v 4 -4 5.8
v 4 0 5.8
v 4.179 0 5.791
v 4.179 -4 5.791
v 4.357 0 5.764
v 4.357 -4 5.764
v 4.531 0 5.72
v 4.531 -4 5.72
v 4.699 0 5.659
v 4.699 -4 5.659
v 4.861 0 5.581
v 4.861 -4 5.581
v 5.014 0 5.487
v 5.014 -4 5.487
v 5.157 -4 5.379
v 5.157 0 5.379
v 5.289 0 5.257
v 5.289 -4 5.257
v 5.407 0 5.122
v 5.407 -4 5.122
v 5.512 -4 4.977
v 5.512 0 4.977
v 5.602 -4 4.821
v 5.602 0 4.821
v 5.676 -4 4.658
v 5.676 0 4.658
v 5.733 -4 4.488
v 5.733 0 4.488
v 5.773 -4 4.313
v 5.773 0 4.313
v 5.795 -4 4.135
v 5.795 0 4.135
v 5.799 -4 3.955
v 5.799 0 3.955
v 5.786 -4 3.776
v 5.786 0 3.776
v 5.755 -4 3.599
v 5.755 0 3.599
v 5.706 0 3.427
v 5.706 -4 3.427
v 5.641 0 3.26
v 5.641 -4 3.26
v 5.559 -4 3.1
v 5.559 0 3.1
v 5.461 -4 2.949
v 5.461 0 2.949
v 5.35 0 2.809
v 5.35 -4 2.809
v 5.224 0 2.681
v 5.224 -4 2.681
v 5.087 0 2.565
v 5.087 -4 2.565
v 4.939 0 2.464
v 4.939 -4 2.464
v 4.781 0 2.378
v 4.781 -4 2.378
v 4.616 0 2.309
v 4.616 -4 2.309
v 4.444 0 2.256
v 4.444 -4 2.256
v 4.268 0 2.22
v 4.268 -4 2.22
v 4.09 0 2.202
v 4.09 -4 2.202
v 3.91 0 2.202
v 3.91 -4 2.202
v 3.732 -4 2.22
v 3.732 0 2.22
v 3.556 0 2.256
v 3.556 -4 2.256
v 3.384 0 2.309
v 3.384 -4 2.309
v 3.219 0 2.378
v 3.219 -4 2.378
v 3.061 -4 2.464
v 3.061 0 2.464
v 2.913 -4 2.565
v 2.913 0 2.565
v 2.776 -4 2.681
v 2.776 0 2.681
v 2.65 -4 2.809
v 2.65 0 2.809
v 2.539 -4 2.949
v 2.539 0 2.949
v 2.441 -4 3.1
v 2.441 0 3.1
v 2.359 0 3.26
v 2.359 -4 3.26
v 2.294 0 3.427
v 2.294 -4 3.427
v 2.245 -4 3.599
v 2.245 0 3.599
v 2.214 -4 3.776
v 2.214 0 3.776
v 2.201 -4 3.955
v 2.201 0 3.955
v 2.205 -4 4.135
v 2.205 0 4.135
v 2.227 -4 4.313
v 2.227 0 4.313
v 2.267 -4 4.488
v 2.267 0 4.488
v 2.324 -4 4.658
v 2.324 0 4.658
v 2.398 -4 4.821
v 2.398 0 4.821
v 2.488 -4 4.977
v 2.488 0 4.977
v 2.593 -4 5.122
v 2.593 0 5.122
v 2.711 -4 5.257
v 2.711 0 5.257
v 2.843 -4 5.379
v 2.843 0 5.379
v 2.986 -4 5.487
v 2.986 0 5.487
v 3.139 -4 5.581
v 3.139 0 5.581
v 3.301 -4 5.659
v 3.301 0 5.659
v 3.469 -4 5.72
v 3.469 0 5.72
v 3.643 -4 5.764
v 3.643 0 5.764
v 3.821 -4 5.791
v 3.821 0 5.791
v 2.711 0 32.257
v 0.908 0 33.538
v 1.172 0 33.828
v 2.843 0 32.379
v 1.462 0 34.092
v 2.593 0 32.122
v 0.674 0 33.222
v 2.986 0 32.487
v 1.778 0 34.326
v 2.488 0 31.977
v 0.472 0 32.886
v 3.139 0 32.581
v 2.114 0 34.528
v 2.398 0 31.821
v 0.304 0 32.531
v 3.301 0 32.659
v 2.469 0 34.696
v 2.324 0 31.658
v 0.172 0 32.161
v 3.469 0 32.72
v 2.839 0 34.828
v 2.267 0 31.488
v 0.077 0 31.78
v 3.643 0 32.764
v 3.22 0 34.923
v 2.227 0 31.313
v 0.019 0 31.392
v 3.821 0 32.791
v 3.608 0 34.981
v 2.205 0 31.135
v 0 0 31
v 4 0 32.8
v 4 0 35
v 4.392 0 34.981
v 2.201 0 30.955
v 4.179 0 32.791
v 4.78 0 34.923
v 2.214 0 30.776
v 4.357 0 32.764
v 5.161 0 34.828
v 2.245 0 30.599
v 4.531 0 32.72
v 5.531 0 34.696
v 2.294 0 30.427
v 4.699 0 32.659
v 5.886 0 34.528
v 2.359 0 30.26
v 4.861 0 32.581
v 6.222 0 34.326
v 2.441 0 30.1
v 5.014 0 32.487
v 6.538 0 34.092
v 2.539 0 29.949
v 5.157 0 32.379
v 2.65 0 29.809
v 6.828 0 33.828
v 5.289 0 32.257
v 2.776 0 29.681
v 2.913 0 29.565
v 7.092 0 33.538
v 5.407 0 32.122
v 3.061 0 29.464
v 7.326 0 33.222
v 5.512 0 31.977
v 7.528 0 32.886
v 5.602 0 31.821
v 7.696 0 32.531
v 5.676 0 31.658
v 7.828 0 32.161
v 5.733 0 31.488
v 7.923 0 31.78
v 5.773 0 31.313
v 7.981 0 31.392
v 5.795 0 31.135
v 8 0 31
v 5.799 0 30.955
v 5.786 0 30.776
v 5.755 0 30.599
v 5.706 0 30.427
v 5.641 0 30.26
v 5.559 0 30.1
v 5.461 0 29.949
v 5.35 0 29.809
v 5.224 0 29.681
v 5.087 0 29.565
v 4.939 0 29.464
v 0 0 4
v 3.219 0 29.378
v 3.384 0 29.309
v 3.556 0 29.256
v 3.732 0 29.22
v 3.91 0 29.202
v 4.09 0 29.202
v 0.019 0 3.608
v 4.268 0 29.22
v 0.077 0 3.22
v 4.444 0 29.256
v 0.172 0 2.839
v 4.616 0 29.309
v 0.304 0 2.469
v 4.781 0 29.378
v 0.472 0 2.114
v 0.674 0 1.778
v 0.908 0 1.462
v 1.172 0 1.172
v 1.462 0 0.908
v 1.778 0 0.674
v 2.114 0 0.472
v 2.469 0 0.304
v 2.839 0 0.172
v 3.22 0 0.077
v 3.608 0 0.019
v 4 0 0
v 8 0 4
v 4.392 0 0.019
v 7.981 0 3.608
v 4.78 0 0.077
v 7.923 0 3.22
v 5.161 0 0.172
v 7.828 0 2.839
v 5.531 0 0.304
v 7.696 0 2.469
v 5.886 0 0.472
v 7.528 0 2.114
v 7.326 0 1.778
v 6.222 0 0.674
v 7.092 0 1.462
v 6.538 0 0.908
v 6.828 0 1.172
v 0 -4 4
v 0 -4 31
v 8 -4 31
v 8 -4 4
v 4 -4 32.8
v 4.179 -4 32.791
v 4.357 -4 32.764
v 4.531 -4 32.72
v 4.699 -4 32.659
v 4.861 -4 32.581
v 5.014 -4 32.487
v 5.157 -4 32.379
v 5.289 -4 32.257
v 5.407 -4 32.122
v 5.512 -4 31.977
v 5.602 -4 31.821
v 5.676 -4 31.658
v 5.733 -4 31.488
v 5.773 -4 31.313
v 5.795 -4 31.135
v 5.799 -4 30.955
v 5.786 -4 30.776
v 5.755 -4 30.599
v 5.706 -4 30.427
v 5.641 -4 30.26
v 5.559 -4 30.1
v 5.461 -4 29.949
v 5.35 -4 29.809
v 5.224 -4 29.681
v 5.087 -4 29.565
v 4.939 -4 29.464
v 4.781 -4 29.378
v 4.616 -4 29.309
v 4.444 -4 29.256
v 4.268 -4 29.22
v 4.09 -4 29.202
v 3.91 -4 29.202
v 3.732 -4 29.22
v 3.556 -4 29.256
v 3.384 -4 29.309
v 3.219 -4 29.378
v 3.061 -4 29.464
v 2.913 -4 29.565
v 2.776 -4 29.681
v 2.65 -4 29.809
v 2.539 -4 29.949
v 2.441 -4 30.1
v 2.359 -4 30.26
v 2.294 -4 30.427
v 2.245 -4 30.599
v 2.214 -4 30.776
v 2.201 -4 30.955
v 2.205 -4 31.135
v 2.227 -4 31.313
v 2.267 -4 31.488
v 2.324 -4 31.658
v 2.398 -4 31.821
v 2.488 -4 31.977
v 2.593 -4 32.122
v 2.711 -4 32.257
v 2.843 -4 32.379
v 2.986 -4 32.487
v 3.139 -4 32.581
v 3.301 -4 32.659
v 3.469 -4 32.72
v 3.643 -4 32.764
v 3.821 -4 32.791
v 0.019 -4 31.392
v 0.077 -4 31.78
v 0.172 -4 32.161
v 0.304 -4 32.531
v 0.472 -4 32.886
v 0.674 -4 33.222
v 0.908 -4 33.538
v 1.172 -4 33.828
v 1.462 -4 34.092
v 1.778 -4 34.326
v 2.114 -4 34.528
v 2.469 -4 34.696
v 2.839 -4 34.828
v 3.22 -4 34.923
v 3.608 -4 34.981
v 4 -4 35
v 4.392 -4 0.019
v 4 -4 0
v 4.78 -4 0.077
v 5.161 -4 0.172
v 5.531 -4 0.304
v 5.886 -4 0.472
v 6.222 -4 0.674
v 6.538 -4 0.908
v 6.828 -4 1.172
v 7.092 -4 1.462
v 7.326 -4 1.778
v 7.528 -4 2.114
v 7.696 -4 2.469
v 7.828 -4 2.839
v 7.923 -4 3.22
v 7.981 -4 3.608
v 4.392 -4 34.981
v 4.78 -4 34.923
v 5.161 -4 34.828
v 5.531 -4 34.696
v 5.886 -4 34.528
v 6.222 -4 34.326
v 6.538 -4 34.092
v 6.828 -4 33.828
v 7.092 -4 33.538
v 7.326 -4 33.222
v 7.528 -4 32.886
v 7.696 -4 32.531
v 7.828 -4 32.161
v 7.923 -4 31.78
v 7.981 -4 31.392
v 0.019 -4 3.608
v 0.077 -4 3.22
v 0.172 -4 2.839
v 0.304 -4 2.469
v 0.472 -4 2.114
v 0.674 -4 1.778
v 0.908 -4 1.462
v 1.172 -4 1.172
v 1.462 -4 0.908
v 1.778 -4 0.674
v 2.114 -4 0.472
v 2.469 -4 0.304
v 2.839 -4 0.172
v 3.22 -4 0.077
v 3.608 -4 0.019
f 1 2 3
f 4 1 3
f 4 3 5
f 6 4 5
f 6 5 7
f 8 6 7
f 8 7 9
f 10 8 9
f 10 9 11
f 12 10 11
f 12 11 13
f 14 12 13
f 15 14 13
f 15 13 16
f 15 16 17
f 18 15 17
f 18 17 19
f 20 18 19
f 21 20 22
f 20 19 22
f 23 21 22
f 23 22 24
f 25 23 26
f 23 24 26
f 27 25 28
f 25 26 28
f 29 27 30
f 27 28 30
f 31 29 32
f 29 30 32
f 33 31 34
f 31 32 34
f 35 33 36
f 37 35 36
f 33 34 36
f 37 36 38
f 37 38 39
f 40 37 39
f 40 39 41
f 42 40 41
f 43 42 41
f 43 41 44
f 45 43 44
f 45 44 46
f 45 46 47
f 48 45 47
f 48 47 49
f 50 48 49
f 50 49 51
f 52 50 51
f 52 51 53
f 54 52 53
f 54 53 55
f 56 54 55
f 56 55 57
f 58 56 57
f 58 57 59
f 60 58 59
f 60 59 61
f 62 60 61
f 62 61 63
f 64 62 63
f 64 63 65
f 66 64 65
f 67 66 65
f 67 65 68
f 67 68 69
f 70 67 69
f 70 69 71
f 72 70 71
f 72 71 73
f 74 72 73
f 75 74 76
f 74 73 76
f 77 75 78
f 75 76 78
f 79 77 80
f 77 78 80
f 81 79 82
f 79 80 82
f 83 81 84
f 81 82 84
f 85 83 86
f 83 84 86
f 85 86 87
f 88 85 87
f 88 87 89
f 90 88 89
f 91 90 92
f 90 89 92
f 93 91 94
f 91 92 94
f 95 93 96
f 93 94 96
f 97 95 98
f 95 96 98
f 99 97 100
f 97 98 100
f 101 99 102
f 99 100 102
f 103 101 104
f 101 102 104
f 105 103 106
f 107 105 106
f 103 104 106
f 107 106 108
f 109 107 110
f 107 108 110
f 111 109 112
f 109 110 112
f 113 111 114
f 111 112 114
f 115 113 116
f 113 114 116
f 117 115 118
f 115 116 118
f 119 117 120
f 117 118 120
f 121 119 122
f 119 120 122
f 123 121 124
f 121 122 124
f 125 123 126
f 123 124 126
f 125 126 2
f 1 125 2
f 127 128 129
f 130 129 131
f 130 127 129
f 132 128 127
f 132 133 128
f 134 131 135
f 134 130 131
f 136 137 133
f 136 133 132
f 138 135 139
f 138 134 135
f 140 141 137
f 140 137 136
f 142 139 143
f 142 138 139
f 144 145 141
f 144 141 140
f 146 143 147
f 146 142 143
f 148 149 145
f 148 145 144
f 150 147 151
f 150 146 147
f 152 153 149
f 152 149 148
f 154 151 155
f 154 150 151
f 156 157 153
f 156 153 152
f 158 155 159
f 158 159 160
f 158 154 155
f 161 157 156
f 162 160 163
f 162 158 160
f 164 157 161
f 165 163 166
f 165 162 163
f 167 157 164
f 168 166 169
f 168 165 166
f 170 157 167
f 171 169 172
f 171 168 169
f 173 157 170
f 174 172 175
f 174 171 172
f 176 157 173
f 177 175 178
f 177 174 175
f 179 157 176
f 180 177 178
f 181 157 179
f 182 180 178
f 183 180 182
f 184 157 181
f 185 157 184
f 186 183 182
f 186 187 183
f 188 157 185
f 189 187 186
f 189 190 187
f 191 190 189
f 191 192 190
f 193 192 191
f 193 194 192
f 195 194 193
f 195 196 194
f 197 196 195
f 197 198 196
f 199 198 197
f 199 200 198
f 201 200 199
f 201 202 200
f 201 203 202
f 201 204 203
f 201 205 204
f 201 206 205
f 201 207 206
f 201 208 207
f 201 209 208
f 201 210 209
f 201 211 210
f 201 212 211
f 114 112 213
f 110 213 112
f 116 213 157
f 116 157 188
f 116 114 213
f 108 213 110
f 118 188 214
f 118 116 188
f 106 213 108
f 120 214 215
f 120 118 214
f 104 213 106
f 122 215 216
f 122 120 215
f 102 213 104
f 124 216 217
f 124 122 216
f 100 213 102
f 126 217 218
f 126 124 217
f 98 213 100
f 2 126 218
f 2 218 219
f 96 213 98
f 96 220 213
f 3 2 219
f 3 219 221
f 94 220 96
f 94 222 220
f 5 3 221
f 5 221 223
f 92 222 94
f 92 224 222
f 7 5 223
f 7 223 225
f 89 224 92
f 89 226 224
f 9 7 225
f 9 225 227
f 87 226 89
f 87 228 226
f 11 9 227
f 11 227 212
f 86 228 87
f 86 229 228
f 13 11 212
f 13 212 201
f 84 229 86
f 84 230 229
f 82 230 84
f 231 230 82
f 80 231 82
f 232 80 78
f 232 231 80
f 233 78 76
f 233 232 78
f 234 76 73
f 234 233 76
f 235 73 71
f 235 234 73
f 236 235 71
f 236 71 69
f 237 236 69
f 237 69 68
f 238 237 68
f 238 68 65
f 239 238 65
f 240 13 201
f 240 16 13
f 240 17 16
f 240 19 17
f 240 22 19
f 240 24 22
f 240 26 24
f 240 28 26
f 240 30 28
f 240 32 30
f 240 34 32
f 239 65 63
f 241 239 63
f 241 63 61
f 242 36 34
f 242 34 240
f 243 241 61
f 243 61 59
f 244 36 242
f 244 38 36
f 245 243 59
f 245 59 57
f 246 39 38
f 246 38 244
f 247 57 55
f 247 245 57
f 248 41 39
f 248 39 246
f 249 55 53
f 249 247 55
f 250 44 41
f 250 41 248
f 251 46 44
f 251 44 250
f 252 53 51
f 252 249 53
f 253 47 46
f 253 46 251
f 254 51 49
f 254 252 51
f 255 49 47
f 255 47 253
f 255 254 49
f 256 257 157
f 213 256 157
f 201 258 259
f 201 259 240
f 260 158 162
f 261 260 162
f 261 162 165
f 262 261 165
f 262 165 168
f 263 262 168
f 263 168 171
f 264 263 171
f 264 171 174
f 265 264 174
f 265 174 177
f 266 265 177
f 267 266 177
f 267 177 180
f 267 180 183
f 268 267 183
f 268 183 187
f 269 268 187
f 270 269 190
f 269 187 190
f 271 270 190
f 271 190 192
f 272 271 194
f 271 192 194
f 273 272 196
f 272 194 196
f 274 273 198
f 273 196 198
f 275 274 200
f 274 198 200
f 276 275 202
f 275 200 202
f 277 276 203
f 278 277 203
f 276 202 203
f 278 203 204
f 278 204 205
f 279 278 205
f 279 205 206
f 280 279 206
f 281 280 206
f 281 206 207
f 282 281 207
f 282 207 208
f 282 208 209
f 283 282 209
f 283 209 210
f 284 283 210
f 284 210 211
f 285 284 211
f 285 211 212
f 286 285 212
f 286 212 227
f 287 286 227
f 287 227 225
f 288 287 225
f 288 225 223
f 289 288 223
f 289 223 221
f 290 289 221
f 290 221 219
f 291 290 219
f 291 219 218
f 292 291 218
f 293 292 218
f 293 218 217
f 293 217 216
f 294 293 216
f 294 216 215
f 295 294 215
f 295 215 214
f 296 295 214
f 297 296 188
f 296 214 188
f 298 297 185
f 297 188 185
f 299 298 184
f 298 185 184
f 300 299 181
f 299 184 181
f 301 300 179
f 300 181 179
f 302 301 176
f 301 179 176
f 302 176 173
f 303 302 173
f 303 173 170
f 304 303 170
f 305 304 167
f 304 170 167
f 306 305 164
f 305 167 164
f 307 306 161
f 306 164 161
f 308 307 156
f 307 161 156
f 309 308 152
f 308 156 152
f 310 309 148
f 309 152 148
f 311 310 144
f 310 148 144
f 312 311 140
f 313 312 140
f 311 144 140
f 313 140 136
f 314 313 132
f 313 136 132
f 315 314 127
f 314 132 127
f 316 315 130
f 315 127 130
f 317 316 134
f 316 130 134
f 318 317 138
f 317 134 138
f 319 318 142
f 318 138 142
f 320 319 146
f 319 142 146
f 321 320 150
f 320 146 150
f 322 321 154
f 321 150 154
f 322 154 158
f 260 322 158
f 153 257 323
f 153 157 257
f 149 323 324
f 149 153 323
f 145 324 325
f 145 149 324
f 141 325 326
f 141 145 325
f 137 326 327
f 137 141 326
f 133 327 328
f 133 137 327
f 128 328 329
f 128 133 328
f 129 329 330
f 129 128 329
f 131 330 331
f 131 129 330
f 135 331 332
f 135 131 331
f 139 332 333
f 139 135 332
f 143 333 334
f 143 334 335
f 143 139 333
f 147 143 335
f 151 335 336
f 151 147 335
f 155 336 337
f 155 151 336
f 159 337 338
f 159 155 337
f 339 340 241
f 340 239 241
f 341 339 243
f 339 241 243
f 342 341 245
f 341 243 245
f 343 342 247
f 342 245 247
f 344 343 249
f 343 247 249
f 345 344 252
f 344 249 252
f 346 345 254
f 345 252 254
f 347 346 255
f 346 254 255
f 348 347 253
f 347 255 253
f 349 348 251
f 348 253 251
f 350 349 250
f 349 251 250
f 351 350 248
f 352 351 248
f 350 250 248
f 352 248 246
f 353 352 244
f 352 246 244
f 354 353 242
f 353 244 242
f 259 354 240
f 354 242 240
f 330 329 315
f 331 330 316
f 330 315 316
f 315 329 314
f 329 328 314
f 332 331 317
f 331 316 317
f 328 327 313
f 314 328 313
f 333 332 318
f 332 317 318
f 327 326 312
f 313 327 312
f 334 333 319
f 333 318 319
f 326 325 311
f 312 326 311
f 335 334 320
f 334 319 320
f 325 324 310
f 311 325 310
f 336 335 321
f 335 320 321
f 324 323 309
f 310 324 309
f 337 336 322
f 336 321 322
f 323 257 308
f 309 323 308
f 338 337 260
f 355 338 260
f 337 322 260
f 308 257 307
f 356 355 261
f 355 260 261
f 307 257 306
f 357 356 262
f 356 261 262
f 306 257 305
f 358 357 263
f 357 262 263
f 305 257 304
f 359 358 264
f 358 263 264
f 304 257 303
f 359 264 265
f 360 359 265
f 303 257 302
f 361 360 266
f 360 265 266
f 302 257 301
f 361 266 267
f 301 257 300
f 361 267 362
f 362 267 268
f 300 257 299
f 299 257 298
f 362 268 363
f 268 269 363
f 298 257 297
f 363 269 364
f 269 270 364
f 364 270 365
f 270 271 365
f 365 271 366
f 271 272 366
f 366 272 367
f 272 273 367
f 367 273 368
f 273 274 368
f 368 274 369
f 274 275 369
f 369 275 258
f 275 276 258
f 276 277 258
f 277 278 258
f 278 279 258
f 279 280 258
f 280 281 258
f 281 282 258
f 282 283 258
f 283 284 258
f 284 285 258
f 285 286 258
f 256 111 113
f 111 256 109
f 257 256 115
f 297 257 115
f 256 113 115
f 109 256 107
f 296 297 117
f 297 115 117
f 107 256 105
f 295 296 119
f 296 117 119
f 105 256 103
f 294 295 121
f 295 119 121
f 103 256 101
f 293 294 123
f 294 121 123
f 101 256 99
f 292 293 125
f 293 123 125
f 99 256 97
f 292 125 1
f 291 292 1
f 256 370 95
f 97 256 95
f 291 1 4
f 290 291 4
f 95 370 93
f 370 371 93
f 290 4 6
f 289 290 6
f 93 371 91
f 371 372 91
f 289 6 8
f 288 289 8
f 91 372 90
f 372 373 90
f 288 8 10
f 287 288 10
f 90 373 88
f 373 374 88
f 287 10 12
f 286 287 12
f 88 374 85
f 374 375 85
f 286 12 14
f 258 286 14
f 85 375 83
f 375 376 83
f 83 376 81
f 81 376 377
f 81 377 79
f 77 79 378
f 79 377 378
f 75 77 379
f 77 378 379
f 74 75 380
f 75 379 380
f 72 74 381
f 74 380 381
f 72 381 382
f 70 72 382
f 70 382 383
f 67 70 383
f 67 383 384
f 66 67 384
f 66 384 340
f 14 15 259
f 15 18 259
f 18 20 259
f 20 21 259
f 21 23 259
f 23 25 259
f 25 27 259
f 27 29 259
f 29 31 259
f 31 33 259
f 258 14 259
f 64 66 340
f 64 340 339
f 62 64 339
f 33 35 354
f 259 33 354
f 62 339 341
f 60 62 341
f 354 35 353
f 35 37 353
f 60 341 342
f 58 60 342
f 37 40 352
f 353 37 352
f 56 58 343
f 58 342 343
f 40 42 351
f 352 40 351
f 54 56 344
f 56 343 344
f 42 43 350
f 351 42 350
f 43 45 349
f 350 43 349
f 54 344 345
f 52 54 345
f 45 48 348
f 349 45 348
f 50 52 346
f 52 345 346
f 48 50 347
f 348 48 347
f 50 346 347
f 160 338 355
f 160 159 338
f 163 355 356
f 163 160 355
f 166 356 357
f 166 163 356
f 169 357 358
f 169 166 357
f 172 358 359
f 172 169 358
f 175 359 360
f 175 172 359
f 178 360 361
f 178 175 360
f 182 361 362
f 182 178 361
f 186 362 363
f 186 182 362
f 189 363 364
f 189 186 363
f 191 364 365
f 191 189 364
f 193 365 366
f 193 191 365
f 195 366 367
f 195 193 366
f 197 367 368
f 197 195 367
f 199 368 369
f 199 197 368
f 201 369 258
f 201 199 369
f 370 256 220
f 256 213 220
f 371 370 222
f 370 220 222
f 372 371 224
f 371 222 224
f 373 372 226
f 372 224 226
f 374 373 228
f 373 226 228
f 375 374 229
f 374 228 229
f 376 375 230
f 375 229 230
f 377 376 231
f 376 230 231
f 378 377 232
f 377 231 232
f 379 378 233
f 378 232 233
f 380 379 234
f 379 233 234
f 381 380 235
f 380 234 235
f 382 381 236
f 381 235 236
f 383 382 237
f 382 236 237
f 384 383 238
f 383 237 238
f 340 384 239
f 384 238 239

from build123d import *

# Parameters (mm, degrees)
SKETCH1_W           = 8
SKETCH1_H           = 4
BOSS_EXTRUDE1_DEPTH = 35
SKETCH2_R           = 1.8
CUT_EXTRUDE1_DEPTH  = 37.124783736
FILLET1_R           = 4


with BuildPart() as part:
    # Sketch1 → Boss-Extrude1 (new body)
    with BuildSketch(Plane.XY):
        with Locations((4, -2)):
            Rectangle(SKETCH1_W, SKETCH1_H)
    extrude(amount=BOSS_EXTRUDE1_DEPTH)

    # Sketch2 → Cut-Extrude1 (cut, through all)
    with BuildSketch(Plane(origin=(0, 0, 0), x_dir=(1, 0, 0), z_dir=(0, 1, 0))):
        with Locations(Location((4, -4, 0), (0, 0, 270))):
            Circle(SKETCH2_R)
        with Locations(Location((4, -31, 0), (0, 0, 270))):
            Circle(SKETCH2_R)
    extrude(amount=-CUT_EXTRUDE1_DEPTH, mode=Mode.SUBTRACT)

    # Fillet1
    fillet1_edges = [part.edges().sort_by_distance(p)[0] for p in [
        (0, -2, 0),
        (8, -2, 0),
        (0, -2, 35),
        (8, -2, 35),
    ]]
    fillet(fillet1_edges, radius=FILLET1_R - 0.0001)  # a hair under: the kernel refuses the full size


solid = part.part
